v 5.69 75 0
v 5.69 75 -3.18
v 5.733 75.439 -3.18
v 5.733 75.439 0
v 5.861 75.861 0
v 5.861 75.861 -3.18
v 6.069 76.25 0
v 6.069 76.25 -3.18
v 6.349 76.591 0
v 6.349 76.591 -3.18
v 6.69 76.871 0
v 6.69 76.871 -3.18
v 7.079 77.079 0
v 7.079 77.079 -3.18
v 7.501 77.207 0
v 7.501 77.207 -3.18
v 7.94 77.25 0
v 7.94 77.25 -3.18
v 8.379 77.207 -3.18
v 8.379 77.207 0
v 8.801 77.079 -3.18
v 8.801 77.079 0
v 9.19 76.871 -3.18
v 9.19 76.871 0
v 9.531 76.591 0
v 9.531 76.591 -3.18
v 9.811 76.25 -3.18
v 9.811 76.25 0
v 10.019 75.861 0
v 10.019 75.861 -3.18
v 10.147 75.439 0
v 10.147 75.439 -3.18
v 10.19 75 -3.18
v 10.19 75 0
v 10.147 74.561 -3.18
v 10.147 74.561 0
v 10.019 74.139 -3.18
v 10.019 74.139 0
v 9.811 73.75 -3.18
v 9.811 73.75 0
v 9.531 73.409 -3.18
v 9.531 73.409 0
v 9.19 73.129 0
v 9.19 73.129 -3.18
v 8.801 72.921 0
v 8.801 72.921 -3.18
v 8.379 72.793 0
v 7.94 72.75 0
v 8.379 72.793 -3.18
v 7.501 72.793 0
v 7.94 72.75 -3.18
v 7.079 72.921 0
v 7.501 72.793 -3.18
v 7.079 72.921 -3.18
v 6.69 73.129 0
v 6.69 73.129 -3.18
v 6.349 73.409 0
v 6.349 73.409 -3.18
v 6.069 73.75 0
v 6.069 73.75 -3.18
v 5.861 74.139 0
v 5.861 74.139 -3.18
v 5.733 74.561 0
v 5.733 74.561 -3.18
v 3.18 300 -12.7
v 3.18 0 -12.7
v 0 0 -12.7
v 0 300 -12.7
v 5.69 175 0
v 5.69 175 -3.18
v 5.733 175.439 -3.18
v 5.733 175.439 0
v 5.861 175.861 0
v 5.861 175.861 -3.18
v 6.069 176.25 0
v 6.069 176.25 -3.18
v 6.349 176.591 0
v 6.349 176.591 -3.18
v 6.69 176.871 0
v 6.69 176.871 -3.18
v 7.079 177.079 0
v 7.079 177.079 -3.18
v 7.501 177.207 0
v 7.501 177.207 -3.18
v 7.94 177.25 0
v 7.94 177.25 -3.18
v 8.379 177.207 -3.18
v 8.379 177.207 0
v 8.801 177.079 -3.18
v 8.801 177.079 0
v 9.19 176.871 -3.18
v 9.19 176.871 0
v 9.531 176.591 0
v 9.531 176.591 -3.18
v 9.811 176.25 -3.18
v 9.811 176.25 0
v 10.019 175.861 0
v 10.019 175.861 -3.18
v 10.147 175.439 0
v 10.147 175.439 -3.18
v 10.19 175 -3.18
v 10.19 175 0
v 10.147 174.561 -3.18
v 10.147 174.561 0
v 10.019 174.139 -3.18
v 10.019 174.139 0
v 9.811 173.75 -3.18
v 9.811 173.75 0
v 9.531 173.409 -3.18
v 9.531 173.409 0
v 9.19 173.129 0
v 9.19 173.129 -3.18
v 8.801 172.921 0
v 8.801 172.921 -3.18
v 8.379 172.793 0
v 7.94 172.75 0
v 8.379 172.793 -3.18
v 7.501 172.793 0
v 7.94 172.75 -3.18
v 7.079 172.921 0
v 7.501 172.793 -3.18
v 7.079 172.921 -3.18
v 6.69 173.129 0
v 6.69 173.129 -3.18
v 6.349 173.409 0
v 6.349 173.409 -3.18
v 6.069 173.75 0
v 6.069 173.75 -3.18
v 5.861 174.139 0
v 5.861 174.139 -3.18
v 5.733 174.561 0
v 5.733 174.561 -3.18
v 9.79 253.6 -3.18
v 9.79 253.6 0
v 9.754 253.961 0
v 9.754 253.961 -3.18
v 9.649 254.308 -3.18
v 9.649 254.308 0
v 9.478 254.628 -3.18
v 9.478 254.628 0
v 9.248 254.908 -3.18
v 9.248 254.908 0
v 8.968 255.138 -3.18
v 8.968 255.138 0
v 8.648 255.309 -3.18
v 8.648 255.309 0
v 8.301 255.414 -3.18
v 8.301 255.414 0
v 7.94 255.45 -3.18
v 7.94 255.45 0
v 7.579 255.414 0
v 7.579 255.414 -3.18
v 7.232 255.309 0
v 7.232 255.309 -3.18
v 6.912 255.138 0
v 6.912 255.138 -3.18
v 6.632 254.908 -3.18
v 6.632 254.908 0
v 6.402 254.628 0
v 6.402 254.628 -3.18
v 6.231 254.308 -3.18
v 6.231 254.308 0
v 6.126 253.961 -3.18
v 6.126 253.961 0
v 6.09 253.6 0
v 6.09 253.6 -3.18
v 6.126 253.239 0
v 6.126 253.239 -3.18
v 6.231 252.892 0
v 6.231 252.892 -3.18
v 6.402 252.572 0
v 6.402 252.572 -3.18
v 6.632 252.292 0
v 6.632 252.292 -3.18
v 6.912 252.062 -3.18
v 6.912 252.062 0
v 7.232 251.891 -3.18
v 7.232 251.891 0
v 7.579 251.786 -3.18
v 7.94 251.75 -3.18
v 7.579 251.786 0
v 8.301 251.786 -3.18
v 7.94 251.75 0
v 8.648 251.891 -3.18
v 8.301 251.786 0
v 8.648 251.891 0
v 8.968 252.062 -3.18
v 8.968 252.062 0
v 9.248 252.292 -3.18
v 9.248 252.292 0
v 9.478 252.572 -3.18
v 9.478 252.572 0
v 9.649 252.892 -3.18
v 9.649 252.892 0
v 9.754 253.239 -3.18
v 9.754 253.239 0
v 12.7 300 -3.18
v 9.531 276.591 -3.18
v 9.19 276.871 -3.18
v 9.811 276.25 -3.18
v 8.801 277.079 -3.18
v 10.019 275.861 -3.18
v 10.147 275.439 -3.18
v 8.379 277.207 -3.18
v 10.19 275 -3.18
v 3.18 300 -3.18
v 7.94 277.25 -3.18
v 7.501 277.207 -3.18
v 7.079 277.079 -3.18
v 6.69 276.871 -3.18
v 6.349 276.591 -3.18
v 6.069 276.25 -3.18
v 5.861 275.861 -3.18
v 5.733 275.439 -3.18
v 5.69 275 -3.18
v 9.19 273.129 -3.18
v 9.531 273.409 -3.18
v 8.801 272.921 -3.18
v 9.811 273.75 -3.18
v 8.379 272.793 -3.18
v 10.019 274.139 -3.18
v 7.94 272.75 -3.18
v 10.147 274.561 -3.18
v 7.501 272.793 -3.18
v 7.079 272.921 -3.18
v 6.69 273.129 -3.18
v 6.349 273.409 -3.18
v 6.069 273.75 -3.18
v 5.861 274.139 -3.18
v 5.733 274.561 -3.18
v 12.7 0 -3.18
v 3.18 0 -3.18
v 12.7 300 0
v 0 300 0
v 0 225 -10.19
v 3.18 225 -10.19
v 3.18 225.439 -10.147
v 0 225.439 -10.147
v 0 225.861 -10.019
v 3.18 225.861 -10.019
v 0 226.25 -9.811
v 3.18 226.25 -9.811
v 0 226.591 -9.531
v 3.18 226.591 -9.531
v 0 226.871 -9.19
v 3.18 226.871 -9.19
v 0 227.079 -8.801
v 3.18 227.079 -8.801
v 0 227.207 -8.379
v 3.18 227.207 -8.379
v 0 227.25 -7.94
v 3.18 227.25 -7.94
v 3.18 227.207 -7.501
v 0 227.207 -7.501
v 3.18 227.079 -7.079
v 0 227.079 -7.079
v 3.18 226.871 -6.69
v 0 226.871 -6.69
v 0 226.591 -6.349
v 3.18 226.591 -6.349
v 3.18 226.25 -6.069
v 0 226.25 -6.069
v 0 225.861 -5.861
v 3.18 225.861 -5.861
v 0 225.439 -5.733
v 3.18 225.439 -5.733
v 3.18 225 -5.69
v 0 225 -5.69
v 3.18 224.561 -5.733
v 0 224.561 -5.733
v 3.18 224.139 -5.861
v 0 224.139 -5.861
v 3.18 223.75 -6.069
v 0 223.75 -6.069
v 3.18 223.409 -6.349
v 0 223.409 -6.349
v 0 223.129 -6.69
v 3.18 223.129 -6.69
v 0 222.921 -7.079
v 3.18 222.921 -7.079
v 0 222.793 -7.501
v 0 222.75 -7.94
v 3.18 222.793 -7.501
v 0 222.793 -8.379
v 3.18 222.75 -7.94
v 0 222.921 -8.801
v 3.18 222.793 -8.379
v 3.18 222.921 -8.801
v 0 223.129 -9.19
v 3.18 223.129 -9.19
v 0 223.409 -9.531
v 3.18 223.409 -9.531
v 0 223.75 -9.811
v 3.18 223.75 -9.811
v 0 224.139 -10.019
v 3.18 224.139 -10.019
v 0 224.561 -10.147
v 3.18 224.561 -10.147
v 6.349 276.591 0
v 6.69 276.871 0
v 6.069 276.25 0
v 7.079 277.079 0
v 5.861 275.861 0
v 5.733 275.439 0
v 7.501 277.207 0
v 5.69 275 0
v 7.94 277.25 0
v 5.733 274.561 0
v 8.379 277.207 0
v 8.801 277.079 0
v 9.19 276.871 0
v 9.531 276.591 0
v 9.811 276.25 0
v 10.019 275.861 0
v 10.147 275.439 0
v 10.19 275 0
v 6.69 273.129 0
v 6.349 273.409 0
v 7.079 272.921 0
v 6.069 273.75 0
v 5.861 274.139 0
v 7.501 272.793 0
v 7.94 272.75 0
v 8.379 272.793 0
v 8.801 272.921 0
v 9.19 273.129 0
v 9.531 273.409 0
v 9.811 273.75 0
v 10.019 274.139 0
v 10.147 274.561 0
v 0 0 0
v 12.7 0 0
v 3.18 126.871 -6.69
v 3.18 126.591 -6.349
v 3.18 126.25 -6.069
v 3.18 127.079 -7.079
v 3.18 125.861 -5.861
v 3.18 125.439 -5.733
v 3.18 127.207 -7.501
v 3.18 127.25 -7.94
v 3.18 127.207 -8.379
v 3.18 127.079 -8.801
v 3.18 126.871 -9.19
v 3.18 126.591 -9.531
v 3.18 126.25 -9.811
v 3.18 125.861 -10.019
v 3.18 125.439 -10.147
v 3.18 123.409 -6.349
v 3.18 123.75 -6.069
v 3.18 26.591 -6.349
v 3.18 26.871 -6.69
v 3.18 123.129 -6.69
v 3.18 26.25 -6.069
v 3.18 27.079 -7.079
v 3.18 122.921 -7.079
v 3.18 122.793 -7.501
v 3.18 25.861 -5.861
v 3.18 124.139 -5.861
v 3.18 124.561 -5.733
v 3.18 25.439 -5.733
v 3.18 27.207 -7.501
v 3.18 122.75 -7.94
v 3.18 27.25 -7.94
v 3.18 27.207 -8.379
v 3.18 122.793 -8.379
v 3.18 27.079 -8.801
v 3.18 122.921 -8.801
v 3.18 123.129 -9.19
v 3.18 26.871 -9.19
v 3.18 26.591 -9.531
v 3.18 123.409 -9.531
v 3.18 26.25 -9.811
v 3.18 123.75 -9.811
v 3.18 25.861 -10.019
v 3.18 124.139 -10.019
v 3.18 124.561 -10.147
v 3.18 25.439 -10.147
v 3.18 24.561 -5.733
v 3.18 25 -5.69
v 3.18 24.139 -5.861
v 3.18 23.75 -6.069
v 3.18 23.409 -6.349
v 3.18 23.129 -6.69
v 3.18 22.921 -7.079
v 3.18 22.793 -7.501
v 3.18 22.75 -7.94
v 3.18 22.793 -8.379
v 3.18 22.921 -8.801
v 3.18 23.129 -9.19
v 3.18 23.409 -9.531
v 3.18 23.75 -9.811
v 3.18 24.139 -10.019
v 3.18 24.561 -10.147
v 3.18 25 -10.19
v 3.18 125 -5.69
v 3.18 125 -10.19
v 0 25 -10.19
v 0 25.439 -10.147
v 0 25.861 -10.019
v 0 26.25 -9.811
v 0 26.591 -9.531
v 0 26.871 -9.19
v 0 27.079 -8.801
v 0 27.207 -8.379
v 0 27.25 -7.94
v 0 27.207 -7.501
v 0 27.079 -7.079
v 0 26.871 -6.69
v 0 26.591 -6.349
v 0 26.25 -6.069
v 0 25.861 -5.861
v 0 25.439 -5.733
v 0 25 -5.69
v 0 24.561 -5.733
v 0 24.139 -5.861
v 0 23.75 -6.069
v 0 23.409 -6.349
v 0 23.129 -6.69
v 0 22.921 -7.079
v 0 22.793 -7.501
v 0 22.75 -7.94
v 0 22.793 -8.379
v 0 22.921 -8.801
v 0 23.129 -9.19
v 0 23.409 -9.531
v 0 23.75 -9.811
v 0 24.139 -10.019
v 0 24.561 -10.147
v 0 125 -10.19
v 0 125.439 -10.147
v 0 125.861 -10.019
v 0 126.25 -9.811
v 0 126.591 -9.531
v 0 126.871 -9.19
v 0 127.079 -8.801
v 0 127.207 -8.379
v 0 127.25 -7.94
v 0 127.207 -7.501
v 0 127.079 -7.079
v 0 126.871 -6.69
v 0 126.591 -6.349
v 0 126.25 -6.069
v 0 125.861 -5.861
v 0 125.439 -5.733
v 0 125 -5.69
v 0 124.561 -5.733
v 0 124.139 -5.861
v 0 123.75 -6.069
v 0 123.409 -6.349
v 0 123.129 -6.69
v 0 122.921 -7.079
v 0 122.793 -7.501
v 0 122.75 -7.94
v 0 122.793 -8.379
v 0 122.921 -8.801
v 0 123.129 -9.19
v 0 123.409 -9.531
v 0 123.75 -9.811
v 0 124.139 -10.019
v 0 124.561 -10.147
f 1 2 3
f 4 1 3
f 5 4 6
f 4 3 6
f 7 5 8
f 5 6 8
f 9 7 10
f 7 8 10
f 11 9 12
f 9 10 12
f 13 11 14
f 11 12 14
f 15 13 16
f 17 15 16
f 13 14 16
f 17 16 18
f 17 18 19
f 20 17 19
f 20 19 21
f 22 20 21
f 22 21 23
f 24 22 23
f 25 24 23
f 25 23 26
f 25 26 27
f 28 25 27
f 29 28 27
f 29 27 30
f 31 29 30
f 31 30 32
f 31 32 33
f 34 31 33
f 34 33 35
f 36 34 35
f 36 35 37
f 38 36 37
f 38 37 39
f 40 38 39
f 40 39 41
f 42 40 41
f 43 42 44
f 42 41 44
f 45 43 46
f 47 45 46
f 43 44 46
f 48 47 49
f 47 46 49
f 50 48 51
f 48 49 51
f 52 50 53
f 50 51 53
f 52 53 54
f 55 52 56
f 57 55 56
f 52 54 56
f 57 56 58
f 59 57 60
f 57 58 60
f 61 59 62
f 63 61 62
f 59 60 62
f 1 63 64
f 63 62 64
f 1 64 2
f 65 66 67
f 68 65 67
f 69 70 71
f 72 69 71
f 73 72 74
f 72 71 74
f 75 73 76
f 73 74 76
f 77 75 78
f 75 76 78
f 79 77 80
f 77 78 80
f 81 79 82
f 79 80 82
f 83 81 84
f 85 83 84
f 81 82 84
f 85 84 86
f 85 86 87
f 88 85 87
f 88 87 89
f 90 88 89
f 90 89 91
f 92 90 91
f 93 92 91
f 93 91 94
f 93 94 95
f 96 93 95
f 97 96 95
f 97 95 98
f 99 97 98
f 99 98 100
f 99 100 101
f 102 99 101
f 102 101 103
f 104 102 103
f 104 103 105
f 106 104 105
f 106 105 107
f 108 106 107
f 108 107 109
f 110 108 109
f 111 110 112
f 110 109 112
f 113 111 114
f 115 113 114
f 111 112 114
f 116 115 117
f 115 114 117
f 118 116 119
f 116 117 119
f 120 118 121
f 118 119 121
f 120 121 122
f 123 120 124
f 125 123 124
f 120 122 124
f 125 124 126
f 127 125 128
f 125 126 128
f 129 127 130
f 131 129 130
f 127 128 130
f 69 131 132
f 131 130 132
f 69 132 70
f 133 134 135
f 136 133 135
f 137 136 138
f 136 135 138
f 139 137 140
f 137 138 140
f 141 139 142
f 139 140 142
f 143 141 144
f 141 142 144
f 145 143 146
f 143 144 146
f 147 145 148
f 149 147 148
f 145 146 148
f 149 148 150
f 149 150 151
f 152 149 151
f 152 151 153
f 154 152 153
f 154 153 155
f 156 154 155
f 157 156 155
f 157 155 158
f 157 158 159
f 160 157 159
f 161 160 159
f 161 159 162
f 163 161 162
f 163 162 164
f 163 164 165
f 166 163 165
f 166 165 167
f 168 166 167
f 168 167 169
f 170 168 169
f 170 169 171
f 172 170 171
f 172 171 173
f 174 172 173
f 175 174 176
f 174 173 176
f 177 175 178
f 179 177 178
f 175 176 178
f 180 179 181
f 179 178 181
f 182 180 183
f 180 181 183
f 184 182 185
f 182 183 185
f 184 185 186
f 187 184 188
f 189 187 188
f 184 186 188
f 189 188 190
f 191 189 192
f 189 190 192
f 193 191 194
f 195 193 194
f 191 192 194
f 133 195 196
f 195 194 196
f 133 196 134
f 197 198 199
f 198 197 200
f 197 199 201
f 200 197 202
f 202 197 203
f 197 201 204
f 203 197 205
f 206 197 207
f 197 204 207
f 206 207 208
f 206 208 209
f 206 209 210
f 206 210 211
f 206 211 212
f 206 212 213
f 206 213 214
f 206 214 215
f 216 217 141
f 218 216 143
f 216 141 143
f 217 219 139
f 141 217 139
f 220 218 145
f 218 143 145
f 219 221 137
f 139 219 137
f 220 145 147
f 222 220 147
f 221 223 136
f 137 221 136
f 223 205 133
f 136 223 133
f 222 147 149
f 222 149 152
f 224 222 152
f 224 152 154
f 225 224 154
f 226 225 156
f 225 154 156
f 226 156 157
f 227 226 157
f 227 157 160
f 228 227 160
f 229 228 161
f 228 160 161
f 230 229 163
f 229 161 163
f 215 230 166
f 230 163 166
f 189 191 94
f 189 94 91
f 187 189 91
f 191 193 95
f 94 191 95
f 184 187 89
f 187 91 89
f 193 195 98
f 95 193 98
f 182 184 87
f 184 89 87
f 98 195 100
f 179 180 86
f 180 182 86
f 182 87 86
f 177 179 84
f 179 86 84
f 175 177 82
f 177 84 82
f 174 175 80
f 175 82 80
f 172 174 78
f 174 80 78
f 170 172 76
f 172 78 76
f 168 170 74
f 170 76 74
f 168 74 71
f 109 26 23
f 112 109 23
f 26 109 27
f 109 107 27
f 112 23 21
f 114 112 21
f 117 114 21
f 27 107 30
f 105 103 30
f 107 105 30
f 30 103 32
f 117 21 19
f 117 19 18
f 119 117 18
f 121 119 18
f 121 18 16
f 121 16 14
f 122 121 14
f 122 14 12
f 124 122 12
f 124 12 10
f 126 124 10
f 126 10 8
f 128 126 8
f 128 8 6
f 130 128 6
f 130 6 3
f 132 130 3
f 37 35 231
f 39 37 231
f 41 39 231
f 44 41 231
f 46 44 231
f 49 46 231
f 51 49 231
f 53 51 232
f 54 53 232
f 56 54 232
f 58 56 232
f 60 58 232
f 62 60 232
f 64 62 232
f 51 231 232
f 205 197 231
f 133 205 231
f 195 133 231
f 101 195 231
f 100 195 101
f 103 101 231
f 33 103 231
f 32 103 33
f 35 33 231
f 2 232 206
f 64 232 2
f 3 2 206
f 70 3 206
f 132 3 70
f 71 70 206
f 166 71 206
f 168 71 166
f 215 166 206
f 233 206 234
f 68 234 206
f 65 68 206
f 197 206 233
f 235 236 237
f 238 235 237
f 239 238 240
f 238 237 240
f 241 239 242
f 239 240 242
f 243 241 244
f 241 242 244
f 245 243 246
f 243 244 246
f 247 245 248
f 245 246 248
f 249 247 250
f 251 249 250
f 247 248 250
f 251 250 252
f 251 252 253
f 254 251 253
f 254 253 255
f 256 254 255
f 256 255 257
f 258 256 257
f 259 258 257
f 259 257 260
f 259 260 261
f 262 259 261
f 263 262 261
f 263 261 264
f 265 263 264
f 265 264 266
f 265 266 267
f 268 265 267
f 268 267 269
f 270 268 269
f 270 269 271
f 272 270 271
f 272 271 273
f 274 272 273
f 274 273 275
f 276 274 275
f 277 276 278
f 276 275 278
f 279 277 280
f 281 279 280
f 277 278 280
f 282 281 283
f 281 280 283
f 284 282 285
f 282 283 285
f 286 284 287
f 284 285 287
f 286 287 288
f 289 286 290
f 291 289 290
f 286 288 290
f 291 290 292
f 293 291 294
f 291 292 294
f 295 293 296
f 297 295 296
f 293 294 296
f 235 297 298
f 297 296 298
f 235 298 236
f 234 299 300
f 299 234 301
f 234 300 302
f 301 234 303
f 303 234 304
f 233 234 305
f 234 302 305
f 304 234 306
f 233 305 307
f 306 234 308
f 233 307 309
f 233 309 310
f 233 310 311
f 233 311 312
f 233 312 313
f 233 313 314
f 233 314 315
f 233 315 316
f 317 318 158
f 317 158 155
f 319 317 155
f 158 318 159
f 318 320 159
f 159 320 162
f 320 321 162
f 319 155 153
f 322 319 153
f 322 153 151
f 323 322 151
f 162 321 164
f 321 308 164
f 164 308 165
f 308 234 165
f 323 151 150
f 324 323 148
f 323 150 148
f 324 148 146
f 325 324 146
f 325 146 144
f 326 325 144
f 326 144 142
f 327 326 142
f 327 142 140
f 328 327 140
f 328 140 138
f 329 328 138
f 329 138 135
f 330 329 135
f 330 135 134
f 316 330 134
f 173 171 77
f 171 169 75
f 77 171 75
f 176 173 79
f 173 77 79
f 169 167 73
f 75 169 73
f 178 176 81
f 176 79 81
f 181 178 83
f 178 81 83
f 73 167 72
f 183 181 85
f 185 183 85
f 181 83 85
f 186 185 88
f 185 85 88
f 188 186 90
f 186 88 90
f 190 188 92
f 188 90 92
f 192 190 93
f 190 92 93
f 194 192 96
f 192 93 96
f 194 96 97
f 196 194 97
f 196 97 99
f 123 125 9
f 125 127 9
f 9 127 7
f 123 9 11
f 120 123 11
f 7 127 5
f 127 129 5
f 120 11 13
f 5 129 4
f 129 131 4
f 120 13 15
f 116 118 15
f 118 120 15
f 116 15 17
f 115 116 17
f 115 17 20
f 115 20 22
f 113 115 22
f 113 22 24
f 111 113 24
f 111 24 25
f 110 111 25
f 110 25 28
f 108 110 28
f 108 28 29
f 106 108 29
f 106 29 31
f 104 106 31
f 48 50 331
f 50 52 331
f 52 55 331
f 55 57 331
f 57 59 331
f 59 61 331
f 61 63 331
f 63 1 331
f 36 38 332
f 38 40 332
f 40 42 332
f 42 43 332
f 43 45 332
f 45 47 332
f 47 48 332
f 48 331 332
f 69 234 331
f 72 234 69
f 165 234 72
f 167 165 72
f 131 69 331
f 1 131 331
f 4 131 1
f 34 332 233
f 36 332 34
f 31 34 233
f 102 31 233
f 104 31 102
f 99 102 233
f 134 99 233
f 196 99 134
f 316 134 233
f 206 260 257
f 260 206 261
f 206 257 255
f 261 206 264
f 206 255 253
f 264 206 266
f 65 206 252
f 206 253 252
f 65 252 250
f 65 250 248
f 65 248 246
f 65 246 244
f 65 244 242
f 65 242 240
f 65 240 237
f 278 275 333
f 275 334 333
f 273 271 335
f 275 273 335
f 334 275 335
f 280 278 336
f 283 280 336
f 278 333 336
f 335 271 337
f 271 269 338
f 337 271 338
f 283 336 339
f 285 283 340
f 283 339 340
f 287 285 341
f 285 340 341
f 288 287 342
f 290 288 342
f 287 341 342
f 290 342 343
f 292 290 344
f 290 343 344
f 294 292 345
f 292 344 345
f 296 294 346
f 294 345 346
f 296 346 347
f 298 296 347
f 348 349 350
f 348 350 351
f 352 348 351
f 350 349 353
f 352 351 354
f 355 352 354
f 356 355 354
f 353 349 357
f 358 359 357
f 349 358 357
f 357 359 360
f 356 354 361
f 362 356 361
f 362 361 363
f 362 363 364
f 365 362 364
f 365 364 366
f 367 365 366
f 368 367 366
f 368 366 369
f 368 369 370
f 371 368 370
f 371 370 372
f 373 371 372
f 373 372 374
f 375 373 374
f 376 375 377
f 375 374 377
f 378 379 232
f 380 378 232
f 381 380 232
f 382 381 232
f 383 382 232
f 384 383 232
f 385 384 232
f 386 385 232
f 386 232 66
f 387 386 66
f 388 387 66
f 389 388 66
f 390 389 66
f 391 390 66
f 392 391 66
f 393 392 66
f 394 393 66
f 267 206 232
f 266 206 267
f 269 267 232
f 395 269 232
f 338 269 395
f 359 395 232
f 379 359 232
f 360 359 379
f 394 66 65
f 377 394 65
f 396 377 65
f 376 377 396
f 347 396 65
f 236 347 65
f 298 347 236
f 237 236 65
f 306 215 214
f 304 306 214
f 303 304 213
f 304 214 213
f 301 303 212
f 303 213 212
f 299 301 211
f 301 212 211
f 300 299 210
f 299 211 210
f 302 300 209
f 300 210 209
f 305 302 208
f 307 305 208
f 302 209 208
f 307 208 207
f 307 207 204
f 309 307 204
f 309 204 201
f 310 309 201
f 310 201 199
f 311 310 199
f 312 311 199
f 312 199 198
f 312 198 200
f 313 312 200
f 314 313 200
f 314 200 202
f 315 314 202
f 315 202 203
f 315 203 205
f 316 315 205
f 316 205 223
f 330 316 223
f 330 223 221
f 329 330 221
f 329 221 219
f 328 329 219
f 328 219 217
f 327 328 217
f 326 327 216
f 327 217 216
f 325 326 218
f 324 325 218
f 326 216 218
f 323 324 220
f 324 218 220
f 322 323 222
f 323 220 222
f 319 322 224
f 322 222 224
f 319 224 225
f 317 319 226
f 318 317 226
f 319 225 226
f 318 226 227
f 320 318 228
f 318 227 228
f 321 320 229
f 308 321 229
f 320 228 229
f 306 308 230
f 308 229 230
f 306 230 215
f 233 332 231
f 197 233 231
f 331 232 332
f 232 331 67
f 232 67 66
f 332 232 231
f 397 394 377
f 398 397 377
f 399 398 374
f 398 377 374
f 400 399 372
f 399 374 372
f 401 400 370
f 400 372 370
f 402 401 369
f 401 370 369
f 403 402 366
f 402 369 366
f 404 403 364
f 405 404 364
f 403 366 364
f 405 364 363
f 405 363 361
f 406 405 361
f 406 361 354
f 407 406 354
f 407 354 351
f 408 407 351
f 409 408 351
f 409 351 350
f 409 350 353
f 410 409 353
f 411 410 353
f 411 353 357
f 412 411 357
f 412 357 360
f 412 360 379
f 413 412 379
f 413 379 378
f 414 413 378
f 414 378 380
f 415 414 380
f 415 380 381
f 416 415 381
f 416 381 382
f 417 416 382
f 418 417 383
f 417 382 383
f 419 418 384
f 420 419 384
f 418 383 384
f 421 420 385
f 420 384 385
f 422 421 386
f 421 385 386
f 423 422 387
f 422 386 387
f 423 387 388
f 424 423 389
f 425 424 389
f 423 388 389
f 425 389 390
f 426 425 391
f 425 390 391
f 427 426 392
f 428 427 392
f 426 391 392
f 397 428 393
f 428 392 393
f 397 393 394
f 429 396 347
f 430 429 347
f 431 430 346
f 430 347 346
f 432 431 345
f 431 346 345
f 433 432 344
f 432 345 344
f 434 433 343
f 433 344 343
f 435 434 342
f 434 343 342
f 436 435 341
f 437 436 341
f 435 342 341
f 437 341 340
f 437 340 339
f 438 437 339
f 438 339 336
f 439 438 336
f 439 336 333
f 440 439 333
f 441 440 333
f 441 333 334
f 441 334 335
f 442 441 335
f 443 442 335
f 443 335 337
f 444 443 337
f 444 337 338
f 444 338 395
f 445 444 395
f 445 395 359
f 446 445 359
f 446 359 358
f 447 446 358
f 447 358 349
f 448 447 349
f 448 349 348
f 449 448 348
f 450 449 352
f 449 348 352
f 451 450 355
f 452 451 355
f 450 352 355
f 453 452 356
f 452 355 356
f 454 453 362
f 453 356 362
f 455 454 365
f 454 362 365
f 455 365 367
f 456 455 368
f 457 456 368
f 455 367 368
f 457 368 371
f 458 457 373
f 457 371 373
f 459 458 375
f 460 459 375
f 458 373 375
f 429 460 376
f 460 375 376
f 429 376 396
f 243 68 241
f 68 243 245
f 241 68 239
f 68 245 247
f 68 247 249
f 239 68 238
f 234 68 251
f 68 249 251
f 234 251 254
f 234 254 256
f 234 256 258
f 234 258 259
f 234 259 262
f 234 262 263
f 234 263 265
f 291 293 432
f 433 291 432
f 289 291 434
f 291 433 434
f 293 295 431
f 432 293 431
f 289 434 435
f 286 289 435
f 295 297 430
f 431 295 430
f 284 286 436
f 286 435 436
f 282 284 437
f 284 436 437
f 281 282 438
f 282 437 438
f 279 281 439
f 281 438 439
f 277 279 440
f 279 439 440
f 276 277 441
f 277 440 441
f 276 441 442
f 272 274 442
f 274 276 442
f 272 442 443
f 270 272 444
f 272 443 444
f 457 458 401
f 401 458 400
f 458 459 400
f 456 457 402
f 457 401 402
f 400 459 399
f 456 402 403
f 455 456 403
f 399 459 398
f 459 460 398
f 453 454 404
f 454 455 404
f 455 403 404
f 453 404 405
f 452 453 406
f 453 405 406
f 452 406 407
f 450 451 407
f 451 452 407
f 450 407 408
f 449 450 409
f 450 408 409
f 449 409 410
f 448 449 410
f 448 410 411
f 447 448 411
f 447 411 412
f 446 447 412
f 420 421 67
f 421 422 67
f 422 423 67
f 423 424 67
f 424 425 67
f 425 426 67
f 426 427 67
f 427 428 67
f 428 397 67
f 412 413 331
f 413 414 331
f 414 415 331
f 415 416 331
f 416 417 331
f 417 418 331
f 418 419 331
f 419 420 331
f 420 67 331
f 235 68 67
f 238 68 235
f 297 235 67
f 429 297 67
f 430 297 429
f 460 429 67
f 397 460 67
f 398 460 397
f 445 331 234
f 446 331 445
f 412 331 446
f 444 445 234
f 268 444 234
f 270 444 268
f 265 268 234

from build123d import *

# Parameters (mm, degrees)
BOSS_EXTRUDE1_DEPTH = 300
SKETCH3_R           = 2.25
CUT_EXTRUDE1_DEPTH  = 300
SKETCH6_R           = 2.25
CUT_EXTRUDE2_DEPTH  = 10
SKETCH7_R           = 1.85
CUT_EXTRUDE3_DEPTH  = 301.537152445


with BuildPart() as part:
    # Sketch1 → Boss-Extrude1 (new body)
    with BuildSketch(Plane(origin=(0, 0, 0), x_dir=(1, 0, 0), z_dir=(0, 1, 0))):
        Polygon((0, 0), (12.7, 0), (12.7, 3.18), (3.18, 3.18), (3.18, 12.7), (0, 12.7), align=None)
    extrude(amount=BOSS_EXTRUDE1_DEPTH)

    # Sketch3 → Cut-Extrude1 (cut)
    with BuildSketch(Plane(origin=(0, 0, -3.18), x_dir=(-1, 0, 0), z_dir=(0, 0, -1))):
        with Locations((-7.94, 275)):
            Circle(SKETCH3_R)
        with Locations((-7.94, 175)):
            Circle(SKETCH3_R)
        with Locations((-7.94, 75)):
            Circle(SKETCH3_R)
    extrude(amount=-CUT_EXTRUDE1_DEPTH, mode=Mode.SUBTRACT)

    # Sketch6 → Cut-Extrude2 (cut)
    with BuildSketch(Plane(origin=(3.18, 0, 0), x_dir=(0, 0, -1), z_dir=(1, 0, 0))):
        with Locations((7.94, 225)):
            Circle(SKETCH6_R)
        with Locations((7.94, 125)):
            Circle(SKETCH6_R)
        with Locations((7.94, 25)):
            Circle(SKETCH6_R)
    extrude(amount=-CUT_EXTRUDE2_DEPTH, mode=Mode.SUBTRACT)

    # Sketch7 → Cut-Extrude3 (cut, through all)
    with BuildSketch(Plane.XY):
        with Locations((7.94, 253.6)):
            Circle(SKETCH7_R)
    extrude(amount=-CUT_EXTRUDE3_DEPTH, mode=Mode.SUBTRACT)


solid = part.part
